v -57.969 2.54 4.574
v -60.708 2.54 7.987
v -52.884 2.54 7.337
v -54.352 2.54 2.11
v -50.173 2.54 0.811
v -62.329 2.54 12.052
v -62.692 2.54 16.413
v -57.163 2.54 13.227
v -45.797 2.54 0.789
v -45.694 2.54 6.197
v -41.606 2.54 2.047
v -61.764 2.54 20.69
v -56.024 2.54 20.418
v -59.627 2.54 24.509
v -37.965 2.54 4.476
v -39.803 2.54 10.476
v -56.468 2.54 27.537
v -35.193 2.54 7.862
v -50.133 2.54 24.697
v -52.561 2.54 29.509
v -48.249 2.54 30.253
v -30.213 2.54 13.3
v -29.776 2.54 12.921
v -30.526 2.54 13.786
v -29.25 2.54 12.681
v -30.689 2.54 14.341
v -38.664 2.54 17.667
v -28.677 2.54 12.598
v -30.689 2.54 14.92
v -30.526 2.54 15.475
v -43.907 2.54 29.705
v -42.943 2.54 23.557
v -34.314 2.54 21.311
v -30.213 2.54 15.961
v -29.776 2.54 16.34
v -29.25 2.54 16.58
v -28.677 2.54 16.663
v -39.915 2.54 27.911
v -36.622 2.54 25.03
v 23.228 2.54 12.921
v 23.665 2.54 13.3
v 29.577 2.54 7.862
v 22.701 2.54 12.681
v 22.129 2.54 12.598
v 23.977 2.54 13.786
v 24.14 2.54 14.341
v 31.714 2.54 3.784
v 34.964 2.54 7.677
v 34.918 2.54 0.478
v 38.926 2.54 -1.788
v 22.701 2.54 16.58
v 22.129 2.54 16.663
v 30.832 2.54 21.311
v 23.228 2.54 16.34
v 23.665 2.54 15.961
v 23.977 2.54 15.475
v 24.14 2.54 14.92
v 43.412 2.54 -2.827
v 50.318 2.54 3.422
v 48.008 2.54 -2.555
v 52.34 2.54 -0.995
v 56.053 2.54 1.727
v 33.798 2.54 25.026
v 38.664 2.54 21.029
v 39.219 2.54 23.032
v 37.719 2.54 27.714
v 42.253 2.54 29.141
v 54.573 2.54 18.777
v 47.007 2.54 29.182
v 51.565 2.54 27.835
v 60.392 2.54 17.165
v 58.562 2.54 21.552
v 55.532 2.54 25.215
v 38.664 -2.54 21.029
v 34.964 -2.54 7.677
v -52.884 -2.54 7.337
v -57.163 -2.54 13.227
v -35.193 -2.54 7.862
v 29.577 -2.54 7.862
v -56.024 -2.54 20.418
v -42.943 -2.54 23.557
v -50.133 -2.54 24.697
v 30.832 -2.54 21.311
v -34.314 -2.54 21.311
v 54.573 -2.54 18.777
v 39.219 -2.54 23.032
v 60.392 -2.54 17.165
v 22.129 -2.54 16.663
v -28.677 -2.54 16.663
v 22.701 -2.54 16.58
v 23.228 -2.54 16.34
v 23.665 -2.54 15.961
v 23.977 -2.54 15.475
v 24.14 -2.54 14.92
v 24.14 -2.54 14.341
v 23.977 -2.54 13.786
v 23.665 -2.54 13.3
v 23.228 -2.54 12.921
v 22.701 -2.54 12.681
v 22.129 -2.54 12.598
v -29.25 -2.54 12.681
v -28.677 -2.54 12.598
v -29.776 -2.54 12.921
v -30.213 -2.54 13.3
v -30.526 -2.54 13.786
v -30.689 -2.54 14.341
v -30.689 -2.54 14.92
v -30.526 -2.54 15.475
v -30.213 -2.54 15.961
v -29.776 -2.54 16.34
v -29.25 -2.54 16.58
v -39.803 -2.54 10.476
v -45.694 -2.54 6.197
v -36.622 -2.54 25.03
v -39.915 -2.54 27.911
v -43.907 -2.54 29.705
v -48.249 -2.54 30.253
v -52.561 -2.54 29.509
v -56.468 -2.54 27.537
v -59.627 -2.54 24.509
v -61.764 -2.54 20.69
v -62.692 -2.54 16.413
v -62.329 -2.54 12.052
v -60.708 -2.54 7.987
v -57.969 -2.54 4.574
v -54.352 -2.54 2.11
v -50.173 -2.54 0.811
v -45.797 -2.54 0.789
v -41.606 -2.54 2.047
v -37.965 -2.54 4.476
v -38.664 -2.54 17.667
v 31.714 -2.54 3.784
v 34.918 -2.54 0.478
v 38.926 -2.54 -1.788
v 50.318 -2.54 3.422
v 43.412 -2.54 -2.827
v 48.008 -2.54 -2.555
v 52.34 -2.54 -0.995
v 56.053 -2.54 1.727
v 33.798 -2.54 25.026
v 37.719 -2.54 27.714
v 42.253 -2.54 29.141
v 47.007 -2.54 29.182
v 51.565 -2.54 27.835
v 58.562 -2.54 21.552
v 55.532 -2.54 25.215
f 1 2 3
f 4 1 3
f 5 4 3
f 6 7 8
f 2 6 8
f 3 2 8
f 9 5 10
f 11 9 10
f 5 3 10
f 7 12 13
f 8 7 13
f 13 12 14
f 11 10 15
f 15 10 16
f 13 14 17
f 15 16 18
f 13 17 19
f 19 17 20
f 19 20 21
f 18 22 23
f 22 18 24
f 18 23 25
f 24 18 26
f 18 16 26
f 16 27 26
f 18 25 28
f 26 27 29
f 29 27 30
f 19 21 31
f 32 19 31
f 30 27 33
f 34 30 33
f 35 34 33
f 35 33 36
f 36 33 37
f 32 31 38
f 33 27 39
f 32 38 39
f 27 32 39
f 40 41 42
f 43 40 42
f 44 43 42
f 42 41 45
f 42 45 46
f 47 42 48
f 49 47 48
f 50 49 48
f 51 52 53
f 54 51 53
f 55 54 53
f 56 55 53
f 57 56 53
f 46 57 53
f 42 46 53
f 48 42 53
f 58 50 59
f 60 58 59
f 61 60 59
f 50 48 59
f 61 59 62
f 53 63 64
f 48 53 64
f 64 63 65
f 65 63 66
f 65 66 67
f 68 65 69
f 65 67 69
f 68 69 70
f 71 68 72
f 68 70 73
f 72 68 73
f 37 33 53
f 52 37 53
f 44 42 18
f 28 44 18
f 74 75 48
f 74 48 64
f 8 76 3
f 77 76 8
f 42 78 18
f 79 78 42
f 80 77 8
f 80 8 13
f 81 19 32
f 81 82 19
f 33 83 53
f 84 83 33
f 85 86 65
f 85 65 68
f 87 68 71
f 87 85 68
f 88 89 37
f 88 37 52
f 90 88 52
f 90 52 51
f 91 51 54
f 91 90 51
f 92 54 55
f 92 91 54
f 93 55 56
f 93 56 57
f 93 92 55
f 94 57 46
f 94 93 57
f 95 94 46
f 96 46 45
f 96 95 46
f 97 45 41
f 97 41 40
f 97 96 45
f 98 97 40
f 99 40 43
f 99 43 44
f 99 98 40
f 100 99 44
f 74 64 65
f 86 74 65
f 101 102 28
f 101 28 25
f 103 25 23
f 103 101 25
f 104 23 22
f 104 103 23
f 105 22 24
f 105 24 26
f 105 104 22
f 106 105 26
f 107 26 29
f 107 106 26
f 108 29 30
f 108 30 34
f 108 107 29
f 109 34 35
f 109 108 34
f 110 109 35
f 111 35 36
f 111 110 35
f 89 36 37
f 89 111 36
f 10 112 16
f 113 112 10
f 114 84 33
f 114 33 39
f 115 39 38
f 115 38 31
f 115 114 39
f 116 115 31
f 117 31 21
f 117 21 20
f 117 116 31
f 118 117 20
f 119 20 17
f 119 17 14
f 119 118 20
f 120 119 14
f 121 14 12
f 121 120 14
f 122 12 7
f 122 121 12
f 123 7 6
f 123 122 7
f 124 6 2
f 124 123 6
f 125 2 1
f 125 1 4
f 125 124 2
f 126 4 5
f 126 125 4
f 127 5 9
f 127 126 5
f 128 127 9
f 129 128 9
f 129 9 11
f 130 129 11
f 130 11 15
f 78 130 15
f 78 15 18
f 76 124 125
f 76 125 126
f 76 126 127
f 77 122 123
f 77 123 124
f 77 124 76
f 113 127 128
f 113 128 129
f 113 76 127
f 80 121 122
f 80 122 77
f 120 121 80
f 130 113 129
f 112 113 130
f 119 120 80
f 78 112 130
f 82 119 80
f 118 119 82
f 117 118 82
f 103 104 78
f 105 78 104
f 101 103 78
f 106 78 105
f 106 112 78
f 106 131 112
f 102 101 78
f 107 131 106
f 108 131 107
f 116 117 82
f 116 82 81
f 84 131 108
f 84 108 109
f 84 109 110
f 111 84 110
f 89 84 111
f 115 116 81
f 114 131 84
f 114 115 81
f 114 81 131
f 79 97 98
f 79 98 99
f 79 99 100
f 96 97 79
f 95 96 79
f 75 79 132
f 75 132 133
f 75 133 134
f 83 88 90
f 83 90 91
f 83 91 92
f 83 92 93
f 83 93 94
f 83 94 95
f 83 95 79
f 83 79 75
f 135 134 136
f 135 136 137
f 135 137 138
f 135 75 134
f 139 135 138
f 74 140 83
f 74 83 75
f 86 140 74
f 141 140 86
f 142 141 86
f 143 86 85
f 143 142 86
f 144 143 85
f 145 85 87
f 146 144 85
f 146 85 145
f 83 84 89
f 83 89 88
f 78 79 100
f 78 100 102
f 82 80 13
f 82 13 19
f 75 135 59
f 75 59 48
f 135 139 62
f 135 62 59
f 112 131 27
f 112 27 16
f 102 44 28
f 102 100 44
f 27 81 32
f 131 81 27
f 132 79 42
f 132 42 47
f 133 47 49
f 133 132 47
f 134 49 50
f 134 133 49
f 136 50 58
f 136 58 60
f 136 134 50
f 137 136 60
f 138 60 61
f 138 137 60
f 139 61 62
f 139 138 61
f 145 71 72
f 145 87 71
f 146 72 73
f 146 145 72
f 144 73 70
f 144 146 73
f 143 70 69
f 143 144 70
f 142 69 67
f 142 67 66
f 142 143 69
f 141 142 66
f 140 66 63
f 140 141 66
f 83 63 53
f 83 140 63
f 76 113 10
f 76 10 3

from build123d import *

# Parameters (mm, degrees)
F1_DEPTH = 2.54


with BuildPart() as f1:
    # F0 (on Front) → F1 (new body, symmetric)
    with BuildSketch(Plane.XZ):
        with BuildLine():
            Line((-34.314002, 9.582906), (-34.314002, 21.31113))
            ThreePointArc((-34.314002, 21.31113), (-62.691893, 16.413153), (-35.19322, 7.862254))
            ThreePointArc((-35.19322, 7.862254), (-34.725519, 8.708226), (-34.314002, 9.582906))
        make_face()
        Polygon((-42.942699, 23.557279), (-38.663793, 17.666949), (-39.803242, 10.476214), (-45.693572, 6.197308), (-52.884307, 7.336757), (-57.163212, 13.227087), (-56.023764, 20.417822), (-50.133434, 24.696727), align=None, mode=Mode.SUBTRACT)
        with BuildLine():
            Line((30.832, 21.31113), (-34.314002, 21.31113))
            Line((-34.314002, 21.31113), (-34.314002, 9.582906))
            ThreePointArc((-34.314002, 9.582906), (-34.725519, 8.708226), (-35.19322, 7.862254))
            Line((-35.19322, 7.862254), (-34.314002, 7.862254))
            Line((-34.314002, 7.862254), (29.576525, 7.862254))
            ThreePointArc((29.576525, 7.862254), (28.726842, 14.724611), (30.832, 21.31113))
        make_face()
        with BuildLine():
            ThreePointArc((-28.677113, 12.598262), (-30.70935, 14.630499), (-28.677113, 16.662735))
            Line((-28.677113, 16.662735), (22.128796, 16.662735))
            ThreePointArc((22.128796, 16.662735), (24.161033, 14.630499), (22.128796, 12.598262))
            Line((22.128796, 12.598262), (-28.677113, 12.598262))
        make_face(mode=Mode.SUBTRACT)
        with BuildLine():
            ThreePointArc((60.391538, 17.164629), (47.006746, 29.182375), (30.832, 21.31113))
            ThreePointArc((30.832, 21.31113), (28.726842, 14.724611), (29.576525, 7.862254))
            ThreePointArc((29.576525, 7.862254), (41.1317, -2.468564), (56.052909, 1.727312))
            Line((56.052909, 1.727312), (50.318425, 3.422388))
            Line((50.318425, 3.422388), (34.963898, 7.677261))
            Line((34.963898, 7.677261), (38.663793, 21.029043))
            Line((38.663793, 21.029043), (39.218771, 23.031787))
            Line((39.218771, 23.031787), (54.573298, 18.776914))
            Line((54.573298, 18.776914), (60.391538, 17.164629))
        make_face()
    extrude(amount=F1_DEPTH, both=True)


solid = f1.part
